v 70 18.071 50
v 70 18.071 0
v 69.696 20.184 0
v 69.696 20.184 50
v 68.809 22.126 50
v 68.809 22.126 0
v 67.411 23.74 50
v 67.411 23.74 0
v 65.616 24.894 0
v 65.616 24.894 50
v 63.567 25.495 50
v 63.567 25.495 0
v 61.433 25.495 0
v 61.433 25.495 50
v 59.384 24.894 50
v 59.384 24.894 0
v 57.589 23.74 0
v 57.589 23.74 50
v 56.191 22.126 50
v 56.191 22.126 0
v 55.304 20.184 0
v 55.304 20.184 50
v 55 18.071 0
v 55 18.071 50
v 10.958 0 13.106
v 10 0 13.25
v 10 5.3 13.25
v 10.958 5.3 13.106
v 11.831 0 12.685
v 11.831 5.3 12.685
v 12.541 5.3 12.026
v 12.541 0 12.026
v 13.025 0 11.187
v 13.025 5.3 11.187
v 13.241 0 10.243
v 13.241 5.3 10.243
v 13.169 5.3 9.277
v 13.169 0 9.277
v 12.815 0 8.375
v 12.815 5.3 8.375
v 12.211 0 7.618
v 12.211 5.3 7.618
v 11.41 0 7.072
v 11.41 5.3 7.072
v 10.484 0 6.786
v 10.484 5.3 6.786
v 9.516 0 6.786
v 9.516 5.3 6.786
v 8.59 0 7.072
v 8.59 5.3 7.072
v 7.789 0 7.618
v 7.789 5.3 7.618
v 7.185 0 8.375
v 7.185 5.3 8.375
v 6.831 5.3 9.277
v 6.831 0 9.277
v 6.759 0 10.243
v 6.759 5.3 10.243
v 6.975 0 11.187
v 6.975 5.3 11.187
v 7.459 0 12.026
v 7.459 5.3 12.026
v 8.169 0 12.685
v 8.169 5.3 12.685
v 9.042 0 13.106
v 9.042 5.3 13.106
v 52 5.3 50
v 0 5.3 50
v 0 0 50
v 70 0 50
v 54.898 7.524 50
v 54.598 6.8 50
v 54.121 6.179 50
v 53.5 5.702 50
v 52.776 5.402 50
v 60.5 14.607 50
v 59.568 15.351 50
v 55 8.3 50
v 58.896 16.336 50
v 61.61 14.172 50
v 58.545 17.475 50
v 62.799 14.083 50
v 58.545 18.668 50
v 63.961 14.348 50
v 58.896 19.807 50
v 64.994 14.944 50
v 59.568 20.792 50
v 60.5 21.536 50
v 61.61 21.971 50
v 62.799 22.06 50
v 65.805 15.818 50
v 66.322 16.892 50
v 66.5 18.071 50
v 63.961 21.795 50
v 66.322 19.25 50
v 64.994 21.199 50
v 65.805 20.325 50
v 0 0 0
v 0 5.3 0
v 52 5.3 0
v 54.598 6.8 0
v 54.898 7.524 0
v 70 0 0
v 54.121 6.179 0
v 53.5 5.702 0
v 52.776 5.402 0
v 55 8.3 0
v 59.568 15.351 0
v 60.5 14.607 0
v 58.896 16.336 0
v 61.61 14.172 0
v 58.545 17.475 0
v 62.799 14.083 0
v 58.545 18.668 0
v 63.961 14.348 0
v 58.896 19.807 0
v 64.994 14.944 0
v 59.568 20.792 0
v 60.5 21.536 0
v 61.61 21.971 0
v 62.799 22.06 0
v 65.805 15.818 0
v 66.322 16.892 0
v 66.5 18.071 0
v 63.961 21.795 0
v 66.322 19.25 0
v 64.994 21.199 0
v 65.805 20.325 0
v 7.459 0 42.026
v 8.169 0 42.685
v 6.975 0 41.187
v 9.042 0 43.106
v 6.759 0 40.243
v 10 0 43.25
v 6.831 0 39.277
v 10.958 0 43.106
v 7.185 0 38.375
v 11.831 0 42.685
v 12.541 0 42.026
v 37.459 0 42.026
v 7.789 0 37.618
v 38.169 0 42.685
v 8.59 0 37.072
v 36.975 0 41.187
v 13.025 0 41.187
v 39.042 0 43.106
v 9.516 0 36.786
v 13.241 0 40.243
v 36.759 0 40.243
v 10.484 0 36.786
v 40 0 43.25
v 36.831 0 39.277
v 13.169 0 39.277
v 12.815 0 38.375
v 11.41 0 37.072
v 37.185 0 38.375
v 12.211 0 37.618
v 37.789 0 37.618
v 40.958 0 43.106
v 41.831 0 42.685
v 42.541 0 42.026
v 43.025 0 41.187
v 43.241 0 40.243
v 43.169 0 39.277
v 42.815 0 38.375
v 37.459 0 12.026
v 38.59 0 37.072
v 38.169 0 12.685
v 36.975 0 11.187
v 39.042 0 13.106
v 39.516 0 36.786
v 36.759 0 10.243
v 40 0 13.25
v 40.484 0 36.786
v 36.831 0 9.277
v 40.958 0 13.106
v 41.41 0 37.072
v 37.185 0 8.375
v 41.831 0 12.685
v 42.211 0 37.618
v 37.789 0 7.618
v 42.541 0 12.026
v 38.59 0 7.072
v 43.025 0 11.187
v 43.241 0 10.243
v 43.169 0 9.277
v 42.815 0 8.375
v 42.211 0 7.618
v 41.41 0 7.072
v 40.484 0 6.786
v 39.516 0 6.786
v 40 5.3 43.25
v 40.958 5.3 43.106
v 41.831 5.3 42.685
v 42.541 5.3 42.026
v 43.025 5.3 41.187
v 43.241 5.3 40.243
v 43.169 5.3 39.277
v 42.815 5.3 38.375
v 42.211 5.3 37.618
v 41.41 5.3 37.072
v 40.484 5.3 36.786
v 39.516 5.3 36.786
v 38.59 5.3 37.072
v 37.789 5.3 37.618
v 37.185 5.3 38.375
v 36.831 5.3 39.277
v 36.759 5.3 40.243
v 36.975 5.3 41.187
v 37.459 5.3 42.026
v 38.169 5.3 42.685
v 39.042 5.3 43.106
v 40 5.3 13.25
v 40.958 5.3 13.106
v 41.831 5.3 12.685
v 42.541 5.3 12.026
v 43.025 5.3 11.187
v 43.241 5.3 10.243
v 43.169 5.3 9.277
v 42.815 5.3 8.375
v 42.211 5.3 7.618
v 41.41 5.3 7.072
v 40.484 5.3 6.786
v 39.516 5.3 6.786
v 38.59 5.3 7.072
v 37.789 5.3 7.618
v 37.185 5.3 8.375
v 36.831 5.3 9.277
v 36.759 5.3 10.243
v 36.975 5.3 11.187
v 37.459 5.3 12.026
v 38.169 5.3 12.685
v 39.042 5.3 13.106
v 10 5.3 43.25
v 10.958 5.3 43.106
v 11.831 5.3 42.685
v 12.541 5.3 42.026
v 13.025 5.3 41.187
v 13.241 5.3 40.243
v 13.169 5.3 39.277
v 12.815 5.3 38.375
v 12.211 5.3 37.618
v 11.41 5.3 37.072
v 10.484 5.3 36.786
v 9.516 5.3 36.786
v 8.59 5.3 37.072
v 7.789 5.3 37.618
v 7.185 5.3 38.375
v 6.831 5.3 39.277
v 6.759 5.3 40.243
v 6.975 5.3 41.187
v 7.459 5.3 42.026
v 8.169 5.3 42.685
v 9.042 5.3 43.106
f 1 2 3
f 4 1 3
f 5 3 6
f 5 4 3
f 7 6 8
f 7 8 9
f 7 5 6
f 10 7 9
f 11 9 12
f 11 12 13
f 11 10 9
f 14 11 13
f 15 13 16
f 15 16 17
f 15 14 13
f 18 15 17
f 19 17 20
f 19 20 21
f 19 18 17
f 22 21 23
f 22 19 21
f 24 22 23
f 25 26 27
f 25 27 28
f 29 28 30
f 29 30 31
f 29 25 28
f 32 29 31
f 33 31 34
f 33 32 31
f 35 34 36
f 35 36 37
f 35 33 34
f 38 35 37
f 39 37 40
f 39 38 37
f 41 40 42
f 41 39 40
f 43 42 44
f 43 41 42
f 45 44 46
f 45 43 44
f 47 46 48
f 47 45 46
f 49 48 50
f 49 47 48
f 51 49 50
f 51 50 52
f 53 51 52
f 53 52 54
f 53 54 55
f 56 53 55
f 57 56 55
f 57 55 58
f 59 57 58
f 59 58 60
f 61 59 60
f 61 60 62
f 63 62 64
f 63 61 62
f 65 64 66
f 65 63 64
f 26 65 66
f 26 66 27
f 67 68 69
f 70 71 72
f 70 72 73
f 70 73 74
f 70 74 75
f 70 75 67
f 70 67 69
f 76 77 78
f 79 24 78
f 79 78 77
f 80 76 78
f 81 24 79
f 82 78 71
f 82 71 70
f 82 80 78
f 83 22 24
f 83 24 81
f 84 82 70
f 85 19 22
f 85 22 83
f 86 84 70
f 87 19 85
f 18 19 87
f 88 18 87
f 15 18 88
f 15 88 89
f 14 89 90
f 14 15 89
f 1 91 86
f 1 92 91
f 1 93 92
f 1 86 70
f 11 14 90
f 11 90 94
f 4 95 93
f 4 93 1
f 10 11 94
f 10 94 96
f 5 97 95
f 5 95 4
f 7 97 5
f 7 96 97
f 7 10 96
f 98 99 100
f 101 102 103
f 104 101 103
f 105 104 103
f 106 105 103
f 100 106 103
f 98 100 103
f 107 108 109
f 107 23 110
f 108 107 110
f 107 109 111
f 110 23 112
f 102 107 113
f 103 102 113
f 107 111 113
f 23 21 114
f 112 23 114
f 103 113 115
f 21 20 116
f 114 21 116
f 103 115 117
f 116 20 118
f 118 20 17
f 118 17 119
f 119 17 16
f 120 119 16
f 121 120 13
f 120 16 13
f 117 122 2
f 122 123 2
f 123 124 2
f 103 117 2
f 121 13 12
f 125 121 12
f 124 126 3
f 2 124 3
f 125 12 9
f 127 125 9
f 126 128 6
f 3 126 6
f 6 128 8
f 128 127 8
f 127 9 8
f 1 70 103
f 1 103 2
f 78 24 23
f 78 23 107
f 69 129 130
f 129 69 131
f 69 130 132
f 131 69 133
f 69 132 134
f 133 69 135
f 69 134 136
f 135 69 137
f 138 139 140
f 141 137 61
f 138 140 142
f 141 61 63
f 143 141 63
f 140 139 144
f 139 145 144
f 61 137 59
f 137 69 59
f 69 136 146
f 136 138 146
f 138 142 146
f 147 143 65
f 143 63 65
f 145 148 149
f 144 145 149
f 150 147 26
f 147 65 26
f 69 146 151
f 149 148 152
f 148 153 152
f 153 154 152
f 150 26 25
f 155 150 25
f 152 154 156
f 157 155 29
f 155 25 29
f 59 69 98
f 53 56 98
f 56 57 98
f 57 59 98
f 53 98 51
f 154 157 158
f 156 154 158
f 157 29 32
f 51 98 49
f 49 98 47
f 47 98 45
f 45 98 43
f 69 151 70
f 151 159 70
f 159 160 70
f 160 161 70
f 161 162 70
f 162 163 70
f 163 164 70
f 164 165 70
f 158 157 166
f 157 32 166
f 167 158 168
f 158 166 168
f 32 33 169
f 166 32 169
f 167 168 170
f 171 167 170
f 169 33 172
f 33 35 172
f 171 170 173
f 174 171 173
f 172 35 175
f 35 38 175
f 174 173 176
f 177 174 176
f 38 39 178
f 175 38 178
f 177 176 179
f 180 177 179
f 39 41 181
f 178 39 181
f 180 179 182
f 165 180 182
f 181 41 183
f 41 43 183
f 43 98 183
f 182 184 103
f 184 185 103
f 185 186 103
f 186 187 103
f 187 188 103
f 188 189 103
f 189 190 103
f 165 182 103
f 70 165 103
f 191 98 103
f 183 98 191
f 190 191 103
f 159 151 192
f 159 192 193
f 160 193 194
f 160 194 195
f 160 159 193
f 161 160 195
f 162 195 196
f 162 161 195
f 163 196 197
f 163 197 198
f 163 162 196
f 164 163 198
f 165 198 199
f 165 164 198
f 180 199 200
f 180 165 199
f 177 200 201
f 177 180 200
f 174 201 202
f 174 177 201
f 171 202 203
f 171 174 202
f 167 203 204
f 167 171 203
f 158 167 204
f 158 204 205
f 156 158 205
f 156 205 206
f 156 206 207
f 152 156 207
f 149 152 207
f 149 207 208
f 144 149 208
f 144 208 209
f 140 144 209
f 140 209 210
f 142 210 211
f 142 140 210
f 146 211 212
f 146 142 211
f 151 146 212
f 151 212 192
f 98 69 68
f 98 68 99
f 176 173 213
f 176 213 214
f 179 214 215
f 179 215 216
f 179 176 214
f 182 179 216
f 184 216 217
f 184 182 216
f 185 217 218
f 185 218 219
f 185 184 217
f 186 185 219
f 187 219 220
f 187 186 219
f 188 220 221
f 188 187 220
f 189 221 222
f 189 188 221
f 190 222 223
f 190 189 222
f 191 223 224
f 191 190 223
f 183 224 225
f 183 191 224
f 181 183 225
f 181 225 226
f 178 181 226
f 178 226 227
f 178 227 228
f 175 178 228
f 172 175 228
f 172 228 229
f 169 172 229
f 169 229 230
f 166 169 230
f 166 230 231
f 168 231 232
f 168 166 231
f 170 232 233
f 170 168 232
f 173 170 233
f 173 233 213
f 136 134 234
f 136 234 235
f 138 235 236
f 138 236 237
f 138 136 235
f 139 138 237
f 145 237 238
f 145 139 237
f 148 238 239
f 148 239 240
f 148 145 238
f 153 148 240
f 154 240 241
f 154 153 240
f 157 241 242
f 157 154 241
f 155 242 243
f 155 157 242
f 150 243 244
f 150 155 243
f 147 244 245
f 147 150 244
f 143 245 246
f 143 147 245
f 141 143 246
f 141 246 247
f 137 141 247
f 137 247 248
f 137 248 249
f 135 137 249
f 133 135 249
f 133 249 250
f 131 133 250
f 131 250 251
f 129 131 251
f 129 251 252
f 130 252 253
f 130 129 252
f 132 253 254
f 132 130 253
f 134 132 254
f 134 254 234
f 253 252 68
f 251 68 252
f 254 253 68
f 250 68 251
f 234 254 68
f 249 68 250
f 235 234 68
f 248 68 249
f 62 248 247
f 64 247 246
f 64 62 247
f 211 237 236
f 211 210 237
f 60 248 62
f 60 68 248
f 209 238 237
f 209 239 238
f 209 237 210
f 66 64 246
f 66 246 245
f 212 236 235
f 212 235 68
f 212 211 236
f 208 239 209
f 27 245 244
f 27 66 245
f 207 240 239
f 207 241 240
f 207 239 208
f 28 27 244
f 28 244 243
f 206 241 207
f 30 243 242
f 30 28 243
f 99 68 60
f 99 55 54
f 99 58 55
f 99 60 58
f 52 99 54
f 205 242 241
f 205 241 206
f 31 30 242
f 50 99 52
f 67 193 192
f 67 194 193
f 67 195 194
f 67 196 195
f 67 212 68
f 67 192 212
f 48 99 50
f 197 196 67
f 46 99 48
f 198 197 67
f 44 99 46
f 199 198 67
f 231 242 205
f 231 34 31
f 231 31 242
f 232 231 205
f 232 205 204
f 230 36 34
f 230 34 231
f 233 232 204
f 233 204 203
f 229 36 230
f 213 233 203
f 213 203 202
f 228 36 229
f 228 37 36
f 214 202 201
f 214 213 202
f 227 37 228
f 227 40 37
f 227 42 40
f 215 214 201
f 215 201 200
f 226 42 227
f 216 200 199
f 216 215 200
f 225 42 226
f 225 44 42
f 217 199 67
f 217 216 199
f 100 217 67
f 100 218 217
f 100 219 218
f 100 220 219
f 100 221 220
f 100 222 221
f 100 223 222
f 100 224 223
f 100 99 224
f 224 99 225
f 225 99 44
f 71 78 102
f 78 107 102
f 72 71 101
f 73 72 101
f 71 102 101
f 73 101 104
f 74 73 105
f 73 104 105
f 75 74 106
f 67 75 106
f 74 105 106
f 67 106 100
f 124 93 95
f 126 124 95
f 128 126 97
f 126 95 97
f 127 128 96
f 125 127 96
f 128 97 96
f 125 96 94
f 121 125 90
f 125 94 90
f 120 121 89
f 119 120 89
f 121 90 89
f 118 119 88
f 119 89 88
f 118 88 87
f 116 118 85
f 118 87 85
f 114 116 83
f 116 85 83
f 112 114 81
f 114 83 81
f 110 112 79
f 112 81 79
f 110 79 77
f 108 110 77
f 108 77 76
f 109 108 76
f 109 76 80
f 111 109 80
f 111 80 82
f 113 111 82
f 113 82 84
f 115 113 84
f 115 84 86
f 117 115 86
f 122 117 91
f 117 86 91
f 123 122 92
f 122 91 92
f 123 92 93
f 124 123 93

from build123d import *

# Parameters (mm, degrees)
SKETCH1_W           = 50
SKETCH1_H           = 50
SKETCH1_R           = 3.25
SKETCH1_W_2         = 20
BOSS_EXTRUDE1_DEPTH = 5.3
SKETCH2_R           = 4
BOSS_EXTRUDE2_DEPTH = 50
FILLET1_R           = 3


with BuildPart() as part:
    # Sketch1 → Boss-Extrude1 (new body)
    # profile 1 of 2: a face of its own
    with BuildSketch(Plane(origin=(0, 0, 0), x_dir=(1, 0, 0), z_dir=(0, 1, 0))):
        with Locations((25, -25)):
            Rectangle(SKETCH1_W, SKETCH1_H)
        with Locations(Location((10, -40, 0), (0, 0, 270))):
            Circle(SKETCH1_R, mode=Mode.SUBTRACT)
        with Locations(Location((40, -40, 0), (0, 0, 270))):
            Circle(SKETCH1_R, mode=Mode.SUBTRACT)
        with Locations(Location((40, -10, 0), (0, 0, 270))):
            Circle(SKETCH1_R, mode=Mode.SUBTRACT)
        with Locations(Location((10, -10, 0), (0, 0, 270))):
            Circle(SKETCH1_R, mode=Mode.SUBTRACT)
    # profile 2 of 2: a face of its own
    with BuildSketch(Plane(origin=(0, 0, 0), x_dir=(1, 0, 0), z_dir=(0, 1, 0))):
        with Locations((60, -25)):
            Rectangle(SKETCH1_W_2, SKETCH1_H)
    extrude(amount=BOSS_EXTRUDE1_DEPTH)

    # Sketch2 → Boss-Extrude2 (add)
    with BuildSketch(Plane.XY.offset(50)):
        with BuildLine():
            Line((55, 18.071423244), (55, 5.3))
            Line((55, 5.3), (70, 5.3))
            Line((70, 5.3), (70, 18.071423244))
            ThreePointArc((70, 18.071423244), (62.5, 25.571423244), (55, 18.071423244))
        make_face()
        with Locations((62.5, 18.071423244)):
            Circle(SKETCH2_R, mode=Mode.SUBTRACT)
    extrude(amount=-BOSS_EXTRUDE2_DEPTH)

    # Fillet1
    fillet1_edges = [part.edges().sort_by_distance(p)[0] for p in [
        (55, 5.3, 25),
    ]]
    fillet(fillet1_edges, radius=FILLET1_R)


solid = part.part
